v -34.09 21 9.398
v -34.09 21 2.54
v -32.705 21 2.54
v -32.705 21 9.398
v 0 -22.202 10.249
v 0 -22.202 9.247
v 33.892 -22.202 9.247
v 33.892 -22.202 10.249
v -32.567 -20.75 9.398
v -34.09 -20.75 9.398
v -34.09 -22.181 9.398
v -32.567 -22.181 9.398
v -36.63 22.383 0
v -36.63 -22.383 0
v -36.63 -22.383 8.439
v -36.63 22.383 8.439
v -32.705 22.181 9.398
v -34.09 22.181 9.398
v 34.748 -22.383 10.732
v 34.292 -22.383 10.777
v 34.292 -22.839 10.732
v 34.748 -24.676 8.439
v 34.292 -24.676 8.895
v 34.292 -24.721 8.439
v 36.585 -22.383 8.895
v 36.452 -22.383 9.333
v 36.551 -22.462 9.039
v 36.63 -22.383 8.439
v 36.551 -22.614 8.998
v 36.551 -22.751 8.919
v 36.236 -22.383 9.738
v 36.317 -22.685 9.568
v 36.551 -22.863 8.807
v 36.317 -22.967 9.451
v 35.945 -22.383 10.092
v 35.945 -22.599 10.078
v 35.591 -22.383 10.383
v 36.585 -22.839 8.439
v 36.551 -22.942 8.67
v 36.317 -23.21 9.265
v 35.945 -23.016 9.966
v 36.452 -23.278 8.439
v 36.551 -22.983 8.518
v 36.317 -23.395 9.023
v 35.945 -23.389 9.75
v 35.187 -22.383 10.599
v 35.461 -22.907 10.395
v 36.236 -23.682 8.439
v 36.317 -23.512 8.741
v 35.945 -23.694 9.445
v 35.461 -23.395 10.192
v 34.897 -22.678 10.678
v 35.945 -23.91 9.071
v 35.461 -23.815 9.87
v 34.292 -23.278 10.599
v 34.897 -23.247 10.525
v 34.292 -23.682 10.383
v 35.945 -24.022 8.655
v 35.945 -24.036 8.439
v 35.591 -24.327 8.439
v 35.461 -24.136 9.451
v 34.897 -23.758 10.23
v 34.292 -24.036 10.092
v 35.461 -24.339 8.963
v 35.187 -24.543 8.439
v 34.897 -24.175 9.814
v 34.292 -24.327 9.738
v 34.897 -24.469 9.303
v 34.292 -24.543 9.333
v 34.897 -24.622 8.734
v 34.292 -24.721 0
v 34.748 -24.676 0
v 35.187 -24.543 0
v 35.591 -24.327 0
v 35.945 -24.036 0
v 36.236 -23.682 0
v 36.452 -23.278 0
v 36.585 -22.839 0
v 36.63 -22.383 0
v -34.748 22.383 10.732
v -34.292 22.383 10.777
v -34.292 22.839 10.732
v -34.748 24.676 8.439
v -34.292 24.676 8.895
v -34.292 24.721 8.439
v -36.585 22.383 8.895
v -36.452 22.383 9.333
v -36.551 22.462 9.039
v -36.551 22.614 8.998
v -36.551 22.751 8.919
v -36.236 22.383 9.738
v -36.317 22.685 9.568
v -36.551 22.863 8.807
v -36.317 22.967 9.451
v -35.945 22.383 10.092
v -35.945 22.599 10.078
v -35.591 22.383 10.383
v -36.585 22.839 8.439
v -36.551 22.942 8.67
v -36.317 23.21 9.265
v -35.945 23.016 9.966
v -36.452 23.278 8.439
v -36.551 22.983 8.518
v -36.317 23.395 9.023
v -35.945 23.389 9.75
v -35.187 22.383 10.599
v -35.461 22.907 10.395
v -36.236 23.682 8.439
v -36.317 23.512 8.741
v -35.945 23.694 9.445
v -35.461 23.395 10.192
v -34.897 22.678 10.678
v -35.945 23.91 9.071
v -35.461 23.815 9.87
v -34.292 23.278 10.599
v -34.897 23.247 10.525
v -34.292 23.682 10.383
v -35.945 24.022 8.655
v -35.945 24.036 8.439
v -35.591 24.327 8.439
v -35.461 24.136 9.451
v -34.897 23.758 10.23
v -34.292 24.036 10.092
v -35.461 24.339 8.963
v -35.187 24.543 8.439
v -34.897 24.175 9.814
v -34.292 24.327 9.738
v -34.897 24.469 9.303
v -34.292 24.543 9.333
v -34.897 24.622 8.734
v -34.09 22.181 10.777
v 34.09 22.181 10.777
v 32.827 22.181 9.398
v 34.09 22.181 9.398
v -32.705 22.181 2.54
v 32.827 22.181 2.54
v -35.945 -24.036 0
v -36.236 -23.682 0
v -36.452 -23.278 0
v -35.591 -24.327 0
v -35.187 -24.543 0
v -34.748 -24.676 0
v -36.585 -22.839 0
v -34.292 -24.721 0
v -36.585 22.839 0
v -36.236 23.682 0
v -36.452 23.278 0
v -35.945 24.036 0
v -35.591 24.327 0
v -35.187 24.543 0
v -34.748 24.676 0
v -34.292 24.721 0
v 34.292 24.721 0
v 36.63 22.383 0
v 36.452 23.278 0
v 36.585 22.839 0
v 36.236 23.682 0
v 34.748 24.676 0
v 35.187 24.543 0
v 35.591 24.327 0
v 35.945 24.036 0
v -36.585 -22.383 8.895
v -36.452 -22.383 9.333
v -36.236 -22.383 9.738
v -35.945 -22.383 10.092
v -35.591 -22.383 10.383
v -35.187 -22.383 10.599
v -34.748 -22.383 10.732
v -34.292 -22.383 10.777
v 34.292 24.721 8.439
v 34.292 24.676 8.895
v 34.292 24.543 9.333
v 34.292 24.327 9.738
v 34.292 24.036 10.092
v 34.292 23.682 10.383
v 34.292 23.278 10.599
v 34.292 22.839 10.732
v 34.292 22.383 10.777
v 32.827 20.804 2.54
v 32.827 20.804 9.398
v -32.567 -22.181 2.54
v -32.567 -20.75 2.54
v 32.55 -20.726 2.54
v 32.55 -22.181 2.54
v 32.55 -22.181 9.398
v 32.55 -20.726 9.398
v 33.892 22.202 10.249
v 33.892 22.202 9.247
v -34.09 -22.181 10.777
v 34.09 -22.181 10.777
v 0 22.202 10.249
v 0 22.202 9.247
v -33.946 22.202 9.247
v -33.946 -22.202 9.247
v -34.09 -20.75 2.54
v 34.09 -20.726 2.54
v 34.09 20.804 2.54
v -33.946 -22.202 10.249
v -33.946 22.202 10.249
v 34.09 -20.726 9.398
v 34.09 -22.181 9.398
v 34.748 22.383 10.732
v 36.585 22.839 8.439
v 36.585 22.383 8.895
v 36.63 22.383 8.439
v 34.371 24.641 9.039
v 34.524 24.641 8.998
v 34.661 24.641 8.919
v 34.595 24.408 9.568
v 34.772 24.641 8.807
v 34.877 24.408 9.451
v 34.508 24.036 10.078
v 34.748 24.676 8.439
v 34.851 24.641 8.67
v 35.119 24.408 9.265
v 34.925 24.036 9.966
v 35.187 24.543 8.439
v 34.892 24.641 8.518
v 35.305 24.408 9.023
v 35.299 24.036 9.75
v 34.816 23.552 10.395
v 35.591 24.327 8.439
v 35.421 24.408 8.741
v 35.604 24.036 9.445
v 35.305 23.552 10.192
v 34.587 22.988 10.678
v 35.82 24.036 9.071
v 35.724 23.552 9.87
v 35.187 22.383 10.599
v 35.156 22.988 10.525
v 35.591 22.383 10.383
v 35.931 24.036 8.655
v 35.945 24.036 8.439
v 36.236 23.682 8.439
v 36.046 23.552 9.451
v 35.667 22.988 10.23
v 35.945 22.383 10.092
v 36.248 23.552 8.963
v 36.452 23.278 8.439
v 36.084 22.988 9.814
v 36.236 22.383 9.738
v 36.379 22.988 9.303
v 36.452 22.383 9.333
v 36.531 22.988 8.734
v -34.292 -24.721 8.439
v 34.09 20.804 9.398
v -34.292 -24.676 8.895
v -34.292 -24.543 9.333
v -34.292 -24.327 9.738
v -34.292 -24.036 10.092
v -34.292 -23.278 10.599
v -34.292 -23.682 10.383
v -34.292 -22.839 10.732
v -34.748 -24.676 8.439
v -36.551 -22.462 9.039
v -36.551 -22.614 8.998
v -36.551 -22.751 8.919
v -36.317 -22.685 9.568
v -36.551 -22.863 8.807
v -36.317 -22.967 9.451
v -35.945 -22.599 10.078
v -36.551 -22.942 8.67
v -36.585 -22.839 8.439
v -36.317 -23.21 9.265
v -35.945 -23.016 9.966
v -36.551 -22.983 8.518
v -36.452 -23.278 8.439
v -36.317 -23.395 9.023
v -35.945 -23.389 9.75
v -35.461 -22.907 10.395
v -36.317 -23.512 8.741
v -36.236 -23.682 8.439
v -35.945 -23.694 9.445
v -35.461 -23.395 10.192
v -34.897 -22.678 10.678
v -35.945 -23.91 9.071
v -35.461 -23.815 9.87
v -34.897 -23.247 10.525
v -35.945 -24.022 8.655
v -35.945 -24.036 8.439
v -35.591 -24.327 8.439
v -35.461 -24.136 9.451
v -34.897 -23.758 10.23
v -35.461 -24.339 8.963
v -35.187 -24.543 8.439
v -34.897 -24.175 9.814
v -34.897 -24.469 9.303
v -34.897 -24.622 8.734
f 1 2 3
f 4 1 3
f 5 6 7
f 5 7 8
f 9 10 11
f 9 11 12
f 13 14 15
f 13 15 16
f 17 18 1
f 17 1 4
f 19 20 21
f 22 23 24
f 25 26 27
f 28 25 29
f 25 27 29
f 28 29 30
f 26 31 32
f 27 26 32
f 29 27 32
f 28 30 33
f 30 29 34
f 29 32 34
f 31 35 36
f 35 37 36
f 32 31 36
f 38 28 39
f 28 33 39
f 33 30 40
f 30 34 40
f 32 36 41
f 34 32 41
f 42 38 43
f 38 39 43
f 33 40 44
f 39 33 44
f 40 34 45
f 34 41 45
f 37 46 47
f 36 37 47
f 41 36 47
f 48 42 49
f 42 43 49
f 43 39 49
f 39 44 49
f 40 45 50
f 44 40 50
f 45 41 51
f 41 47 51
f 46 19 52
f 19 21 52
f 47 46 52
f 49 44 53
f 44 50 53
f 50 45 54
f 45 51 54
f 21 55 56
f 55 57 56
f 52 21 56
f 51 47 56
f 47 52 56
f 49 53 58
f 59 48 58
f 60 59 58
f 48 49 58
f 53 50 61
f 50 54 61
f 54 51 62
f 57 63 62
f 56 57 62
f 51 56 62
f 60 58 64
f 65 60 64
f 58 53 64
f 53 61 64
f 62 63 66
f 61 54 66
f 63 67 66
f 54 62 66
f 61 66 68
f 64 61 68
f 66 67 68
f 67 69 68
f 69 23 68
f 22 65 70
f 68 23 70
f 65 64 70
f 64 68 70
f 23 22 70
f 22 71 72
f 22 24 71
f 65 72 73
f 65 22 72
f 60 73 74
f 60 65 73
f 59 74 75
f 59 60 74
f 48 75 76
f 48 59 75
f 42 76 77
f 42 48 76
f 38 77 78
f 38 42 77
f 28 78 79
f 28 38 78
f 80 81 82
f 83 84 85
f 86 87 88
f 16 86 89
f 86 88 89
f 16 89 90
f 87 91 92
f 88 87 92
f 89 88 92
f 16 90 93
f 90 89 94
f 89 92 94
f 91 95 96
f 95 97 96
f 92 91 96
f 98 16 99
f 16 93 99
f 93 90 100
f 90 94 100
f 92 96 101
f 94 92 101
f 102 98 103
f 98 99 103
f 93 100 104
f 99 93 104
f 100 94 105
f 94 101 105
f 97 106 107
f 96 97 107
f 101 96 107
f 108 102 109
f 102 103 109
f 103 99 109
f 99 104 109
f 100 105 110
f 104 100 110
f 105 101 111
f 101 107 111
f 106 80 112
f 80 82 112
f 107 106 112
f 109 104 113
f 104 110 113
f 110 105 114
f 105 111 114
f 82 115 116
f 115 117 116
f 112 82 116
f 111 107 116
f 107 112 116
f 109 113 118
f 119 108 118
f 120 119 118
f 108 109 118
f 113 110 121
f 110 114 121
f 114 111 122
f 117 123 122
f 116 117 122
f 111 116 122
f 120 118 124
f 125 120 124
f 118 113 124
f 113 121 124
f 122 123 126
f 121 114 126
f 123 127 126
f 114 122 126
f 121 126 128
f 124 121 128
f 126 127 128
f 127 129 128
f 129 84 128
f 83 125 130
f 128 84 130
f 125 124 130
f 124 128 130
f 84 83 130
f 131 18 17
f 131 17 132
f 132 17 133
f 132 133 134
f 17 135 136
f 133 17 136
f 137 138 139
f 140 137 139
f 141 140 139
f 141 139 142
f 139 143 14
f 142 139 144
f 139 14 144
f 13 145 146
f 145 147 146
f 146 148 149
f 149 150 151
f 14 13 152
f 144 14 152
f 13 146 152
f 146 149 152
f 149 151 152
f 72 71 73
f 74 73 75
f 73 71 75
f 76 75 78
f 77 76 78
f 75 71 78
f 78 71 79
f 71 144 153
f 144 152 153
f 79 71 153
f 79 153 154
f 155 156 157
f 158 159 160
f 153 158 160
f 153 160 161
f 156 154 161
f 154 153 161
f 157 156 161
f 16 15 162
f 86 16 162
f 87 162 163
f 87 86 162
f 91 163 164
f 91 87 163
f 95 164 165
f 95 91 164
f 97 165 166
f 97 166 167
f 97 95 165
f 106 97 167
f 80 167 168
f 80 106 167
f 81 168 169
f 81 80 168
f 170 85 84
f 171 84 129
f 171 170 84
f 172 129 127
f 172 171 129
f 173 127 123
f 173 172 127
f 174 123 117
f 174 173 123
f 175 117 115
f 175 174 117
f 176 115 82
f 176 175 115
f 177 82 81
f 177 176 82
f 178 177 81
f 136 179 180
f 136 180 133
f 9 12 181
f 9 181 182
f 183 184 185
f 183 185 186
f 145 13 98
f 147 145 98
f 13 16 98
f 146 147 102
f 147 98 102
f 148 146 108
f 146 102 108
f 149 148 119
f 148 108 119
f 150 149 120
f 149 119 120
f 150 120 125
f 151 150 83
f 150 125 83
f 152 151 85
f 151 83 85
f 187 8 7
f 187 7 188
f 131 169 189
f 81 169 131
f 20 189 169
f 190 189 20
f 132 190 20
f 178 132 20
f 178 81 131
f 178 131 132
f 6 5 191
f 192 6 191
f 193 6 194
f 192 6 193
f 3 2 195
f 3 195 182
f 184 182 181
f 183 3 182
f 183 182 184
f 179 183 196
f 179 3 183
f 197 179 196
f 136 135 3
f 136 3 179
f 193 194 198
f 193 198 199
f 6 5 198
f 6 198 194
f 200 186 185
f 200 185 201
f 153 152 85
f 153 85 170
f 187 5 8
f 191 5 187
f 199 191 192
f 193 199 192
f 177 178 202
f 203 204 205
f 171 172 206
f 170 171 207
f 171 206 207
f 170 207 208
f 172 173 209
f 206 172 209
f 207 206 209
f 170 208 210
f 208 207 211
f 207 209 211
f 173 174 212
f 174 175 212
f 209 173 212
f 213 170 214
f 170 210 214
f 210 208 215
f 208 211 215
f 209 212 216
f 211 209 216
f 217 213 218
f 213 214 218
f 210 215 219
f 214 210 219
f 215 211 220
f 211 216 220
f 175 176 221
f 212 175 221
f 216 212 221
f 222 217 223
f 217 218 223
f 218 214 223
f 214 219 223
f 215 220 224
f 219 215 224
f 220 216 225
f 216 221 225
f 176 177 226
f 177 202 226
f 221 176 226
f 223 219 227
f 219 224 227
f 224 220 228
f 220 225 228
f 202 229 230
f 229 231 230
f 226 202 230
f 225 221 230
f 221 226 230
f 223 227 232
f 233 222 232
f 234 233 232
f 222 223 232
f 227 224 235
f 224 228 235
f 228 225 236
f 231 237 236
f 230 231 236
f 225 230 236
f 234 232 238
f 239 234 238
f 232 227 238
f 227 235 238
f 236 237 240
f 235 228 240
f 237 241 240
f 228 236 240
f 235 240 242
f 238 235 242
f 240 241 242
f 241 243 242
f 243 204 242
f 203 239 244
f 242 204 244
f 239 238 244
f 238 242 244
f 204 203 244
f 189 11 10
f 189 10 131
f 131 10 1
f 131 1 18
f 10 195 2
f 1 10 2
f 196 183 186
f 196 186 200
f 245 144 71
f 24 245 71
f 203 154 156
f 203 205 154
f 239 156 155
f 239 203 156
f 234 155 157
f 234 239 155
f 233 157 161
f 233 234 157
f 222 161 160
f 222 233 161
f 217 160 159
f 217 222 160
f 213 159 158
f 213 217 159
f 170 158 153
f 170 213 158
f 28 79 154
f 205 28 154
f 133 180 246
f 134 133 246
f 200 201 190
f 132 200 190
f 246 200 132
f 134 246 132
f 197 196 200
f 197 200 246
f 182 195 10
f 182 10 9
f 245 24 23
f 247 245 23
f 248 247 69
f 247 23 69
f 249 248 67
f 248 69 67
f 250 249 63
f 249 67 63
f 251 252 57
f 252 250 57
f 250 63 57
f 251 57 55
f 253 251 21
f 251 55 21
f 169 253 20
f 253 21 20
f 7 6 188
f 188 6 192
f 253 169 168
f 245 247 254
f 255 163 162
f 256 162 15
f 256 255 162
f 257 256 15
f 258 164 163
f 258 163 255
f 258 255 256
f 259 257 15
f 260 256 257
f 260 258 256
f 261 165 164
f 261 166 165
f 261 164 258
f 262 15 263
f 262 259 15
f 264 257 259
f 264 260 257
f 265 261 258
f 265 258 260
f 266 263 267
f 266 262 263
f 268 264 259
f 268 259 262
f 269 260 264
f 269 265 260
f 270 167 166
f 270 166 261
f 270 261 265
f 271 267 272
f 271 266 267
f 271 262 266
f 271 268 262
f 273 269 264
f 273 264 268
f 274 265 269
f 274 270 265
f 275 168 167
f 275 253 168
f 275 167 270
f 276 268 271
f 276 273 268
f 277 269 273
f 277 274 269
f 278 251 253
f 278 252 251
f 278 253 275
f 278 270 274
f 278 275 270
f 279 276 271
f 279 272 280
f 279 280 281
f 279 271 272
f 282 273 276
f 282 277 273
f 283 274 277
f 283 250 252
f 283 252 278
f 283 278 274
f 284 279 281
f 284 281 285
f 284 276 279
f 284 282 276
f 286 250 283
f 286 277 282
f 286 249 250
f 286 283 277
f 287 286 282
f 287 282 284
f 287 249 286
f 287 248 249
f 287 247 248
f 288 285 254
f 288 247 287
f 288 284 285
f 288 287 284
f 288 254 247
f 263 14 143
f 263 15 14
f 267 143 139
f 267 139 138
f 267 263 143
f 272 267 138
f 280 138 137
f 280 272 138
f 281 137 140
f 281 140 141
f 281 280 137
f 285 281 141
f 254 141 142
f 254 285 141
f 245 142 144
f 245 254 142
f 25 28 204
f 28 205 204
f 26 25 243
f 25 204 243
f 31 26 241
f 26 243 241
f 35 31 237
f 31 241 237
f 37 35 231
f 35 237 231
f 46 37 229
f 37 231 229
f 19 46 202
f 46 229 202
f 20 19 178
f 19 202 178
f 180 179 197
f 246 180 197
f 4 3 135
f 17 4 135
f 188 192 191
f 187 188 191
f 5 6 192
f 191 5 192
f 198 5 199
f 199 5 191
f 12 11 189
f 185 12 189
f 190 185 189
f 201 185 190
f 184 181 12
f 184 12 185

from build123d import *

# Parameters (mm, degrees)
F0_W       = 73.260456
F0_H       = 49.441814
F1_DEPTH   = 10.776763
F2_T       = -2.54
F3_R       = 2.33799
F4_W       = 1.399759
F4_H       = 1.294777
F5_DEPTH   = 9.398
F6_W       = 1.563214
F6_H       = 1.507386
F7_DEPTH   = 9.398
F8_W       = 1.542312
F8_H       = 1.454178
F9_DEPTH   = 9.398
F10_W      = 1.663889
F10_H      = 1.606002
F11_DEPTH  = 9.398
F12_W      = 44.404678
F12_H      = 1.001656
F13_DEPTH  = 33.892479
F13_FACE_W = 44.404678
F13_FACE_H = 1.001656
F14_DEPTH  = 33.945933


with BuildPart() as f1:
    # F0 (on Top) → F1 (new body)
    with BuildSketch(Plane.XY):
        Rectangle(F0_W, F0_H)
    extrude(amount=F1_DEPTH)

    # F2
    f2_openings = [f1.faces().sort_by_distance(p)[0] for p in [
        (0, 0, 10.776763),
    ]]
    offset(amount=F2_T, openings=f2_openings)

    # F3
    f3_edges = [f1.edges().sort_by_distance(p)[0] for p in [
        (0, -24.720907, 10.776763),
        (36.630228, 0, 10.776763),
        (0, 24.720907, 10.776763),
        (-36.630228, 0, 10.776763),
        (-36.630228, -24.720907, 5.388381),
        (36.630228, -24.720907, 5.388381),
        (36.630228, 24.720907, 5.388381),
        (-36.630228, 24.720907, 5.388381),
    ]]
    fillet(f3_edges, radius=F3_R)

    # F4 (on Top) → F5 (join)
    with BuildSketch(Plane.XY):
        with Locations((-33.404568, 21.647738)):
            Rectangle(F4_W, F4_H)
    extrude(amount=F5_DEPTH)

    # F6 (on Top) → F7 (join)
    with BuildSketch(Plane.XY):
        with Locations((-33.348691, -21.503959)):
            Rectangle(F6_W, F6_H)
    extrude(amount=F7_DEPTH)

    # F8 (on Top) → F9 (join)
    with BuildSketch(Plane.XY):
        with Locations((33.5986, 21.531241)):
            Rectangle(F8_W, F8_H)
    extrude(amount=F9_DEPTH)

    # F10 (on Top) → F11 (join)
    with BuildSketch(Plane.XY):
        with Locations((33.382011, -21.529004)):
            Rectangle(F10_W, F10_H)
    extrude(amount=F11_DEPTH)


with BuildPart() as f13:
    # F12 (on Right) → F13 (new body)
    with BuildSketch(Plane.YZ):
        with Locations((0, 9.748157)):
            Rectangle(F12_W, F12_H)
    extrude(amount=F13_DEPTH)


with BuildPart() as f14:
    # F13_face (on face) → F14 (new body)
    with BuildSketch(Plane(origin=(0, 0, 9.748157), x_dir=(0, 1, 0), z_dir=(-1, 0, 0))):
        Rectangle(F13_FACE_W, F13_FACE_H)
    extrude(amount=F14_DEPTH)


solid = Compound([f1.part, f13.part, f14.part])
